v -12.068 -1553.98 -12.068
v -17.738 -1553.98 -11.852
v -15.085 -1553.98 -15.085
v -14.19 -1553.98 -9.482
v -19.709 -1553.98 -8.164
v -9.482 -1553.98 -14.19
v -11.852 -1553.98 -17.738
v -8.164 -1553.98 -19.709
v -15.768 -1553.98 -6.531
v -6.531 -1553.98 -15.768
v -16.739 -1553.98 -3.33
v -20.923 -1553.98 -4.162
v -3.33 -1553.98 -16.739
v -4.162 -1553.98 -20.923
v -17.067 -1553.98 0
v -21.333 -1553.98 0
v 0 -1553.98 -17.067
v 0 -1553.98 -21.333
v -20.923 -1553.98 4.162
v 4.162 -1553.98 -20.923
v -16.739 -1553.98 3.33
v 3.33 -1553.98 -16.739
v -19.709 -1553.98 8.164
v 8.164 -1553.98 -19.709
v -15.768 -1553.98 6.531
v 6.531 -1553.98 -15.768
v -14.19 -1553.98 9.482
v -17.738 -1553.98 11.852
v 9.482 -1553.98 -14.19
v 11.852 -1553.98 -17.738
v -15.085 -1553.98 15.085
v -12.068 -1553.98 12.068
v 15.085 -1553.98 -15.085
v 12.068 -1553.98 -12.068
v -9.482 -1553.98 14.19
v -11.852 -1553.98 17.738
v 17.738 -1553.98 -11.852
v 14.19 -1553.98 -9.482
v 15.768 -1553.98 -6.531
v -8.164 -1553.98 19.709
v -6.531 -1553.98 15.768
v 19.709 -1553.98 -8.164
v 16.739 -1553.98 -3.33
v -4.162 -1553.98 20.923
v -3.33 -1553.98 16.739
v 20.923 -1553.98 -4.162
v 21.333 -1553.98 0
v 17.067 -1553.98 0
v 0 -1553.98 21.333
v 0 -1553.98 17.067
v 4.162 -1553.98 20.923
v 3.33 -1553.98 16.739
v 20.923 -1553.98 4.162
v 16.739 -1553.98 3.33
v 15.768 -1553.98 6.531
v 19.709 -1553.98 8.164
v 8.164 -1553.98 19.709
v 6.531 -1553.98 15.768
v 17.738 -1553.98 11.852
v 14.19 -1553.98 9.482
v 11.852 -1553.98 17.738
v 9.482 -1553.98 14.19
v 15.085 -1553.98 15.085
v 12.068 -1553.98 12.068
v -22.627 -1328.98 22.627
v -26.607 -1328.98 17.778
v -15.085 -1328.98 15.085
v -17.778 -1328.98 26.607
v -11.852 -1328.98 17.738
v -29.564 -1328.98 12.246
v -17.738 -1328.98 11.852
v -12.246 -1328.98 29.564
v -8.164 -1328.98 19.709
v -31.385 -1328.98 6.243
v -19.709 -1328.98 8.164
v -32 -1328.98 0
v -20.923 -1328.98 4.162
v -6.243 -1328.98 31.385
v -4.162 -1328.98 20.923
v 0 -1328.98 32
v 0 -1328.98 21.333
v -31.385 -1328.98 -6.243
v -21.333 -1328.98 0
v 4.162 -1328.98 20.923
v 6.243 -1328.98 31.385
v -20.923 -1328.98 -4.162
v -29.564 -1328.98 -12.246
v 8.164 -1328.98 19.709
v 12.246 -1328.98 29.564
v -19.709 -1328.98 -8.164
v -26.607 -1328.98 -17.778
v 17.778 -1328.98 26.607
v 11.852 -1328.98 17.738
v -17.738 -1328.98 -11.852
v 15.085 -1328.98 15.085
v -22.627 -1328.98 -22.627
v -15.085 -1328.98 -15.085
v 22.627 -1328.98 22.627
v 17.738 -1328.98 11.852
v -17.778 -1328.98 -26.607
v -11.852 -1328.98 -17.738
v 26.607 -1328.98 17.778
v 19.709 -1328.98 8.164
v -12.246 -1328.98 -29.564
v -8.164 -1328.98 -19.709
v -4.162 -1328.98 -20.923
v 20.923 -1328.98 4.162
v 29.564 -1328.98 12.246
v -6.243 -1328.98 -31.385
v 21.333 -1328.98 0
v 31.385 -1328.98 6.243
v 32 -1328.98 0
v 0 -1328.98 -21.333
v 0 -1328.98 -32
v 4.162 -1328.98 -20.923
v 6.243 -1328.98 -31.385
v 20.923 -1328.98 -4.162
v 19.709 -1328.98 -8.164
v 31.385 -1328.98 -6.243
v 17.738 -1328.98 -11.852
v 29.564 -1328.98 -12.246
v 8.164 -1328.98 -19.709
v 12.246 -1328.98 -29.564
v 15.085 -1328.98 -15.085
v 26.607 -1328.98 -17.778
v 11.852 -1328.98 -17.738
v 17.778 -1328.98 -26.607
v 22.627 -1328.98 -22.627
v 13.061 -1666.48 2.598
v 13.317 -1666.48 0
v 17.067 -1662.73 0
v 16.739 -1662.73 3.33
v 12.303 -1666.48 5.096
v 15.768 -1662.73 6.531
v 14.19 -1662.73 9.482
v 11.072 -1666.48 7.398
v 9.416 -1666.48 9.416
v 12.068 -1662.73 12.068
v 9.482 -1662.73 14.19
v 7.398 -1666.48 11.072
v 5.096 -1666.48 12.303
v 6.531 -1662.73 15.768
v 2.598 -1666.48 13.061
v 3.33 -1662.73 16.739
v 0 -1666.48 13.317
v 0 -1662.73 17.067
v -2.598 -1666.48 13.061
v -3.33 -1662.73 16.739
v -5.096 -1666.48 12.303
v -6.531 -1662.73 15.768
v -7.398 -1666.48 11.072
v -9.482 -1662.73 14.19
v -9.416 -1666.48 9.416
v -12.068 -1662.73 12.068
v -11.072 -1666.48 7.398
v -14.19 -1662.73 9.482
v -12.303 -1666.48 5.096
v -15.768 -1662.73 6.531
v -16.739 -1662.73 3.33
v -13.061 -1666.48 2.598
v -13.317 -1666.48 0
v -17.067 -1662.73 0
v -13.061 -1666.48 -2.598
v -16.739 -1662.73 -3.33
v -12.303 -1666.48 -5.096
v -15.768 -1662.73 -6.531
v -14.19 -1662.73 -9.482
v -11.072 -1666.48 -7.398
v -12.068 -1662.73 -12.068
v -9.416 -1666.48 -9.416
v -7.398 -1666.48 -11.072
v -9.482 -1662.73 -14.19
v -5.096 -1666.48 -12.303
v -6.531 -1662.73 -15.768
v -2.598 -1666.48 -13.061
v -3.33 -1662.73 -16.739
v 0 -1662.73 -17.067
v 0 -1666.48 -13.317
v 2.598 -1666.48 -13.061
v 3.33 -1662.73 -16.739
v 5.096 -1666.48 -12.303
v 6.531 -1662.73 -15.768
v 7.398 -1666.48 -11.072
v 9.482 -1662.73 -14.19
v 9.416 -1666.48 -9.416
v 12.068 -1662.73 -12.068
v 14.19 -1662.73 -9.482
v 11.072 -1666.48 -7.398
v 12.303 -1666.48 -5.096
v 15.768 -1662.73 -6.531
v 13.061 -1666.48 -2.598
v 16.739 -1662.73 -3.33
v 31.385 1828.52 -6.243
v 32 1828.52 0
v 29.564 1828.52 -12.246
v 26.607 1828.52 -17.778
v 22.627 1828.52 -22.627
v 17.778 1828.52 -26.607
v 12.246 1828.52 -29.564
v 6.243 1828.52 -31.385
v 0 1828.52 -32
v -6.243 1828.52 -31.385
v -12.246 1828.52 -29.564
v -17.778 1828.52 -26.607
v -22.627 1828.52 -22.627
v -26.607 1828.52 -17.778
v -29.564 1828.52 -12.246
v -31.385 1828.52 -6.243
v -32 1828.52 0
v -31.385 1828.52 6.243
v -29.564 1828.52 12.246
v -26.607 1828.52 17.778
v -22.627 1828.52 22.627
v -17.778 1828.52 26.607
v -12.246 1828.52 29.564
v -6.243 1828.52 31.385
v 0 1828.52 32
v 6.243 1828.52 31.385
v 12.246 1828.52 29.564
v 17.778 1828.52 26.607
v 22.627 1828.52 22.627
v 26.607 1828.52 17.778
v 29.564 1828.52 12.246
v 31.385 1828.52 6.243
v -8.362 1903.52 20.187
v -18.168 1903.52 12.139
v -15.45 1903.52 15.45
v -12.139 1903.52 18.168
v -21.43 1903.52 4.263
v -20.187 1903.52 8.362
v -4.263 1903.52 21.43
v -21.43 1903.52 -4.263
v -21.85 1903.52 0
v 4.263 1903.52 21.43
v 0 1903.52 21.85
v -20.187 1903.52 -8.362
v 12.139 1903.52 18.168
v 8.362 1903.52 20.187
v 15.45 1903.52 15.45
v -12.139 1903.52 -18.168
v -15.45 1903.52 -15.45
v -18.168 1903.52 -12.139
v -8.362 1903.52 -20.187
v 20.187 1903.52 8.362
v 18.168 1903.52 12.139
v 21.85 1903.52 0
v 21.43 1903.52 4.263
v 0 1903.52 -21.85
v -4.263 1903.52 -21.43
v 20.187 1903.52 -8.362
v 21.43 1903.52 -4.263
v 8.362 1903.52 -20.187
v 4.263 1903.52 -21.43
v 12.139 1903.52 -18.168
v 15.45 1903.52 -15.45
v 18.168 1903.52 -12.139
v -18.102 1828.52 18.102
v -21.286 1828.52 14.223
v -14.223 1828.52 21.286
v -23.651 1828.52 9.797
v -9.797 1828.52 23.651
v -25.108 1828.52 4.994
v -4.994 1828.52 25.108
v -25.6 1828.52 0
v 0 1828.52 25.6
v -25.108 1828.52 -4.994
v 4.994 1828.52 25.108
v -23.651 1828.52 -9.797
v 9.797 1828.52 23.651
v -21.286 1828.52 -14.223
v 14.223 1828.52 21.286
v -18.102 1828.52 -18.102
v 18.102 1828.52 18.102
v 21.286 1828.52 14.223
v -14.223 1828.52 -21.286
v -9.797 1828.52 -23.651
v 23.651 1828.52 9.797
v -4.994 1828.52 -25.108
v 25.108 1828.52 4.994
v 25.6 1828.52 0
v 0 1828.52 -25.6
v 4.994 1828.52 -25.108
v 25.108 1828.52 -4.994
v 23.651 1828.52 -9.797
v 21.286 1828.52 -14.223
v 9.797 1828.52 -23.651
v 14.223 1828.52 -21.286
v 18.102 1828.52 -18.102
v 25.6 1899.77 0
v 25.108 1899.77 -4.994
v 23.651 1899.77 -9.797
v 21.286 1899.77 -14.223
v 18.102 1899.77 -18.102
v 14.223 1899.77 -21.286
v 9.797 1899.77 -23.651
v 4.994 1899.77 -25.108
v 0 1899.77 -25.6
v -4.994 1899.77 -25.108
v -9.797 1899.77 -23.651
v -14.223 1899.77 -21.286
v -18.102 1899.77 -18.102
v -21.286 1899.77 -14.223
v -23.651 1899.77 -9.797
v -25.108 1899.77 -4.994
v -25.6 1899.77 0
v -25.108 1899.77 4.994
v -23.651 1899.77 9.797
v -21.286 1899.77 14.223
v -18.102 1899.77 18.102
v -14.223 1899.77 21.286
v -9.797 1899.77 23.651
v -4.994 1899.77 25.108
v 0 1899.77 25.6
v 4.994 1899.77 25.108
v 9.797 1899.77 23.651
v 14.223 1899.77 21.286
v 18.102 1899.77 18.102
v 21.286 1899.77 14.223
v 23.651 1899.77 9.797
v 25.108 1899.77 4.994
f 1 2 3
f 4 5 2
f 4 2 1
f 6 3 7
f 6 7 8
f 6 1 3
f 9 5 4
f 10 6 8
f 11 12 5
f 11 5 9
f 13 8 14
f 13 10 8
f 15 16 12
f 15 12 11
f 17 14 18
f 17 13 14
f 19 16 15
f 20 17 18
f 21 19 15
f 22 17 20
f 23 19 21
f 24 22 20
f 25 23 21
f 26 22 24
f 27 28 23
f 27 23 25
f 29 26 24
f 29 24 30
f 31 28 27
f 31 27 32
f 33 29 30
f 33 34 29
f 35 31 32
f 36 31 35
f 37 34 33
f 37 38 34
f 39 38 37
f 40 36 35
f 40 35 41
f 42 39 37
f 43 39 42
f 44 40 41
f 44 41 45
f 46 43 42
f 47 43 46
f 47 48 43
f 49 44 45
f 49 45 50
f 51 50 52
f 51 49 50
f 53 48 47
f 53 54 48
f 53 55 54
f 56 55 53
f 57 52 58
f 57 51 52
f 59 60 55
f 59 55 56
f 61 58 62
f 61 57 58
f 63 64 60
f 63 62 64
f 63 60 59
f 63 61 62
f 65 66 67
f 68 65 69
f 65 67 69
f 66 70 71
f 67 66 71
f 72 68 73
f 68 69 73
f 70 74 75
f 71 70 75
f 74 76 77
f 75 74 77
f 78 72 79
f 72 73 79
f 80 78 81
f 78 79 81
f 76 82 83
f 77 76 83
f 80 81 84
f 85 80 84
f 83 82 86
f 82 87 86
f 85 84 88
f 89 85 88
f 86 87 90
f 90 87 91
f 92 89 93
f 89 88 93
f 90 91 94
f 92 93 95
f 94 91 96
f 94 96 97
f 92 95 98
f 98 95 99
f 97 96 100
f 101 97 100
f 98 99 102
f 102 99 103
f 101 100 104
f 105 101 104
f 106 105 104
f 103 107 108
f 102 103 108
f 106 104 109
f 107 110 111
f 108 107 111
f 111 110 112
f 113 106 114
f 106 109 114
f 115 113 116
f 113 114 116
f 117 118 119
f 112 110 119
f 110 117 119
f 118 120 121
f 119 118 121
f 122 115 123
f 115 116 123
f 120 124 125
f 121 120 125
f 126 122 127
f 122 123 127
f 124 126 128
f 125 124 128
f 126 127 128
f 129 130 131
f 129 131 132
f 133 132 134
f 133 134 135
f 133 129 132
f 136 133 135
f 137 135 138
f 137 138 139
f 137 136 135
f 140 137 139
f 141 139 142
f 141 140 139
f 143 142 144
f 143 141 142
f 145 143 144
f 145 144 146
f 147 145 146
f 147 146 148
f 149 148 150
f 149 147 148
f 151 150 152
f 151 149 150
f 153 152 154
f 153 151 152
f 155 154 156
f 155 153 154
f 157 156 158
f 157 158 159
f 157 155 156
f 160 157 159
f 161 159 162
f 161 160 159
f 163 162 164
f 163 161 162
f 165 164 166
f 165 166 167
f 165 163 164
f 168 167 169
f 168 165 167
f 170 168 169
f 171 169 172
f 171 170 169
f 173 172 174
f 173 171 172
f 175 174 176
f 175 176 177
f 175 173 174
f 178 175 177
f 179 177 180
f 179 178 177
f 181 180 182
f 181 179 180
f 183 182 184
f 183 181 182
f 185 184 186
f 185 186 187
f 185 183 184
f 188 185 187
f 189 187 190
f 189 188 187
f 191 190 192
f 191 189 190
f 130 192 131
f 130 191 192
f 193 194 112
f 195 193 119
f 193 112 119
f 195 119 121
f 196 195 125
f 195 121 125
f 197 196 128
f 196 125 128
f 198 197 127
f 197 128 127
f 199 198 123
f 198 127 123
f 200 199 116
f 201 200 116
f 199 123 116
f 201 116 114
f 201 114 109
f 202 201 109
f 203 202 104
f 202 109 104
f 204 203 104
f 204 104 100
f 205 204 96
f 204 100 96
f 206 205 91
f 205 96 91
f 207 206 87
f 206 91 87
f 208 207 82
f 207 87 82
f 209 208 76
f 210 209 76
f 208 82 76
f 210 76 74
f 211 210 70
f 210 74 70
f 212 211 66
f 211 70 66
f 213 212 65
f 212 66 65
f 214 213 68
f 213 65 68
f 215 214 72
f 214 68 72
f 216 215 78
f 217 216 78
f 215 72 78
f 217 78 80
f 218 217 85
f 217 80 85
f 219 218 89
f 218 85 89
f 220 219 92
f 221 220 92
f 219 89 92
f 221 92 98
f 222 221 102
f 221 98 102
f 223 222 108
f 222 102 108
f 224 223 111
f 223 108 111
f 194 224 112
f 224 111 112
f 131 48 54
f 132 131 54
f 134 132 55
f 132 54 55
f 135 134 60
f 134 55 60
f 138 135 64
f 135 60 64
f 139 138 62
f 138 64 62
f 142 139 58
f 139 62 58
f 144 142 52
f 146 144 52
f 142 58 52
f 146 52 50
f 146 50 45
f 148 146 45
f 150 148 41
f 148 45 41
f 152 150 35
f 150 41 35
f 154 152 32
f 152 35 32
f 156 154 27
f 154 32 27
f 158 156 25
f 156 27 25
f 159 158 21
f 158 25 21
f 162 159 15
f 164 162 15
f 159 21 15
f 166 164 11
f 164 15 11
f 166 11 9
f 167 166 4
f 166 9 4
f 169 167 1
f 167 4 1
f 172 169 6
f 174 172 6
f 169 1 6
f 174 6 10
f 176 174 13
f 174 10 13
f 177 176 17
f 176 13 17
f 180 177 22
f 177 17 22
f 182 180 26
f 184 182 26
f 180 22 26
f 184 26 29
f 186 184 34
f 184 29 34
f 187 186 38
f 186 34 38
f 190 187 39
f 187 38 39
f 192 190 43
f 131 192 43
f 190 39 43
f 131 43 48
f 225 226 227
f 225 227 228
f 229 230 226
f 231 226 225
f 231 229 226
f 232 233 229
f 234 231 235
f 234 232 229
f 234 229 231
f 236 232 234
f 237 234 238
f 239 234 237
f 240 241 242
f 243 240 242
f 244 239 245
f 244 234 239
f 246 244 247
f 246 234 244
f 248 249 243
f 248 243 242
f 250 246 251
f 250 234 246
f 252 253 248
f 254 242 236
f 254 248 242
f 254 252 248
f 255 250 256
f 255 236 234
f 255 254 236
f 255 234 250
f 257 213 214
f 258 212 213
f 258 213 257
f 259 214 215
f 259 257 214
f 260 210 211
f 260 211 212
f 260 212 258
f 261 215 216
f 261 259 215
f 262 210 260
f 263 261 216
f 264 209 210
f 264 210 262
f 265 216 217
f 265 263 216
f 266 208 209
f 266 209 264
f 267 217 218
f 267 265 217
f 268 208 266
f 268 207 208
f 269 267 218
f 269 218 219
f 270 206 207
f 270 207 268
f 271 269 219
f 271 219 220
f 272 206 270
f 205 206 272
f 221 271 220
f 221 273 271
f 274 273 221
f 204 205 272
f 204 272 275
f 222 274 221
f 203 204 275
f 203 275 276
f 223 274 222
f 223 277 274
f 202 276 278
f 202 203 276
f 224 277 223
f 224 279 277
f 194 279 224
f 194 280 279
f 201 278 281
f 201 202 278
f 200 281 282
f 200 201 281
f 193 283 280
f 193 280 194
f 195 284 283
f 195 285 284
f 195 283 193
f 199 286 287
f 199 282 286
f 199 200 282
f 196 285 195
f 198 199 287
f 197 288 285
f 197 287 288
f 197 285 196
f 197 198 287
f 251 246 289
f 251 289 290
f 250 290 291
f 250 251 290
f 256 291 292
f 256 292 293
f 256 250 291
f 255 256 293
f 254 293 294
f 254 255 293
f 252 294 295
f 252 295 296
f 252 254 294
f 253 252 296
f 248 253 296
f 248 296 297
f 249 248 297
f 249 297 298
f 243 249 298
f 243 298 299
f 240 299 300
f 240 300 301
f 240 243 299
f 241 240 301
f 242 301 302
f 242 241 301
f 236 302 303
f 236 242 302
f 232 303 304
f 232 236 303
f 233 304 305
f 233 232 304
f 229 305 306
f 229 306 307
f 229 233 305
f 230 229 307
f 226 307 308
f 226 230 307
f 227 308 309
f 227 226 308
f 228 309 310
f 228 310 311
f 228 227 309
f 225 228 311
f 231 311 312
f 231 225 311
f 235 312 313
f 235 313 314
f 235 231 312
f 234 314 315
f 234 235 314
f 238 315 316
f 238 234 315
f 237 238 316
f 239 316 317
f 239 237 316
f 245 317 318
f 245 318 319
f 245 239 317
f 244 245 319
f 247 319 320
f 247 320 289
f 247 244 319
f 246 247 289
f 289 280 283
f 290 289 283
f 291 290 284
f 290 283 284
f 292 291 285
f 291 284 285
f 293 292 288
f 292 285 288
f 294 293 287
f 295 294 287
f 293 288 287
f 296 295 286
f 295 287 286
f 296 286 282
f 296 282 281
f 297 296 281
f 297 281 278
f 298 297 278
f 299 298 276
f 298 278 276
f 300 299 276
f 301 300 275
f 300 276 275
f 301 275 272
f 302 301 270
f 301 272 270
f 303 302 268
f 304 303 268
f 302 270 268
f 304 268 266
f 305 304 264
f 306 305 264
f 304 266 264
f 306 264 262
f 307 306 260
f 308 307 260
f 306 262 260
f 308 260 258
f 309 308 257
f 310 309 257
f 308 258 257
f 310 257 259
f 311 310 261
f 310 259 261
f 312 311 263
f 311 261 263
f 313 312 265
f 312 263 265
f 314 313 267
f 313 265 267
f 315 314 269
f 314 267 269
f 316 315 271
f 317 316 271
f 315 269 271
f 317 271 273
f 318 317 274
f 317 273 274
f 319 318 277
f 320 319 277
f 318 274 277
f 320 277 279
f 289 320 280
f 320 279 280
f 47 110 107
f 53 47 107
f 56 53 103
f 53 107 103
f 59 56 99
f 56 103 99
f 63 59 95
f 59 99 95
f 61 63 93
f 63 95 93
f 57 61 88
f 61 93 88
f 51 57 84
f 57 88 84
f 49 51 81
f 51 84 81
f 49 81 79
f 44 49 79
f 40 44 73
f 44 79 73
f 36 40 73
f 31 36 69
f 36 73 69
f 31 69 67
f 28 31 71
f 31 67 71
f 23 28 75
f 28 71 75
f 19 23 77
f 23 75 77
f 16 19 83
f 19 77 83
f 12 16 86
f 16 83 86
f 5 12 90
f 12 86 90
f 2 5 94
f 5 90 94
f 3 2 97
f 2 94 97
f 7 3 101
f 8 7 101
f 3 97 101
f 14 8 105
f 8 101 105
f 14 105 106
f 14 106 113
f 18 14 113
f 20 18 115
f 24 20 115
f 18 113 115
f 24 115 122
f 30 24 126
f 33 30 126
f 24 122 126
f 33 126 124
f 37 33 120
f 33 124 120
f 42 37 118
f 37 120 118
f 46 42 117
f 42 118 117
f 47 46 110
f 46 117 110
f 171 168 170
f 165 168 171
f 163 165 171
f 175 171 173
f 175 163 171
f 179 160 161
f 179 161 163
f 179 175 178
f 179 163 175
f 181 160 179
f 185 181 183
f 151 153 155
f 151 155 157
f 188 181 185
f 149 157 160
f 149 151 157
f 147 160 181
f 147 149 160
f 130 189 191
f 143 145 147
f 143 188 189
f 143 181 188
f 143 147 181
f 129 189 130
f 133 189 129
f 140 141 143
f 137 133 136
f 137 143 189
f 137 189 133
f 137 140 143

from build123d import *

# Parameters (mm, degrees)
SKETCH4_R           = 4.266666667
BOSS_EXTRUDE1_DEPTH = 421
SKETCH5_R           = 3.413333333
BOSS_EXTRUDE2_DEPTH = 10
CHAMFER1_SIZE       = 0.5
SKETCH6_R           = 2.844444444
BOSS_EXTRUDE3_DEPTH = 30
SKETCH7_R           = 2.275555556
BOSS_EXTRUDE4_DEPTH = 15
CHAMFER2_SIZE       = 0.5
SCALE1_SCALE        = 7.5


with BuildPart() as part:
    # Sketch4 → Boss-Extrude1 (new body)
    with BuildSketch(Plane(origin=(0, 0, 0), x_dir=(1, 0, 0), z_dir=(0, 1, 0))):
        Circle(SKETCH4_R)
    extrude(amount=BOSS_EXTRUDE1_DEPTH)

    # Sketch5 → Boss-Extrude2 (add)
    with BuildSketch(Plane(origin=(0, 421, 0), x_dir=(1, 0, 0), z_dir=(0, 1, 0))):
        Circle(SKETCH5_R)
    extrude(amount=BOSS_EXTRUDE2_DEPTH)

    # Chamfer1
    chamfer1_edges = [part.edges().sort_by_distance(p)[0] for p in [
        (-3.413333333, 431, 0),
    ]]
    chamfer(chamfer1_edges, length=CHAMFER1_SIZE)

    # Sketch6 → Boss-Extrude3 (add)
    with BuildSketch(Plane.XZ):
        Circle(SKETCH6_R)
    extrude(amount=BOSS_EXTRUDE3_DEPTH)

    # Sketch7 → Boss-Extrude4 (add)
    with BuildSketch(Plane.XZ.offset(30)):
        Circle(SKETCH7_R)
    extrude(amount=BOSS_EXTRUDE4_DEPTH)

    # Chamfer2
    chamfer2_edges = [part.edges().sort_by_distance(p)[0] for p in [
        (-2.275555556, -45, 0),
    ]]
    chamfer(chamfer2_edges, length=CHAMFER2_SIZE)


with BuildPart() as part_1:
    # Scale1: scaled about (0, 204.458486732, 0)
    add(part.part.scale(SCALE1_SCALE).moved(Location((0, -1328.980163758, 0))))


solid = part_1.part
